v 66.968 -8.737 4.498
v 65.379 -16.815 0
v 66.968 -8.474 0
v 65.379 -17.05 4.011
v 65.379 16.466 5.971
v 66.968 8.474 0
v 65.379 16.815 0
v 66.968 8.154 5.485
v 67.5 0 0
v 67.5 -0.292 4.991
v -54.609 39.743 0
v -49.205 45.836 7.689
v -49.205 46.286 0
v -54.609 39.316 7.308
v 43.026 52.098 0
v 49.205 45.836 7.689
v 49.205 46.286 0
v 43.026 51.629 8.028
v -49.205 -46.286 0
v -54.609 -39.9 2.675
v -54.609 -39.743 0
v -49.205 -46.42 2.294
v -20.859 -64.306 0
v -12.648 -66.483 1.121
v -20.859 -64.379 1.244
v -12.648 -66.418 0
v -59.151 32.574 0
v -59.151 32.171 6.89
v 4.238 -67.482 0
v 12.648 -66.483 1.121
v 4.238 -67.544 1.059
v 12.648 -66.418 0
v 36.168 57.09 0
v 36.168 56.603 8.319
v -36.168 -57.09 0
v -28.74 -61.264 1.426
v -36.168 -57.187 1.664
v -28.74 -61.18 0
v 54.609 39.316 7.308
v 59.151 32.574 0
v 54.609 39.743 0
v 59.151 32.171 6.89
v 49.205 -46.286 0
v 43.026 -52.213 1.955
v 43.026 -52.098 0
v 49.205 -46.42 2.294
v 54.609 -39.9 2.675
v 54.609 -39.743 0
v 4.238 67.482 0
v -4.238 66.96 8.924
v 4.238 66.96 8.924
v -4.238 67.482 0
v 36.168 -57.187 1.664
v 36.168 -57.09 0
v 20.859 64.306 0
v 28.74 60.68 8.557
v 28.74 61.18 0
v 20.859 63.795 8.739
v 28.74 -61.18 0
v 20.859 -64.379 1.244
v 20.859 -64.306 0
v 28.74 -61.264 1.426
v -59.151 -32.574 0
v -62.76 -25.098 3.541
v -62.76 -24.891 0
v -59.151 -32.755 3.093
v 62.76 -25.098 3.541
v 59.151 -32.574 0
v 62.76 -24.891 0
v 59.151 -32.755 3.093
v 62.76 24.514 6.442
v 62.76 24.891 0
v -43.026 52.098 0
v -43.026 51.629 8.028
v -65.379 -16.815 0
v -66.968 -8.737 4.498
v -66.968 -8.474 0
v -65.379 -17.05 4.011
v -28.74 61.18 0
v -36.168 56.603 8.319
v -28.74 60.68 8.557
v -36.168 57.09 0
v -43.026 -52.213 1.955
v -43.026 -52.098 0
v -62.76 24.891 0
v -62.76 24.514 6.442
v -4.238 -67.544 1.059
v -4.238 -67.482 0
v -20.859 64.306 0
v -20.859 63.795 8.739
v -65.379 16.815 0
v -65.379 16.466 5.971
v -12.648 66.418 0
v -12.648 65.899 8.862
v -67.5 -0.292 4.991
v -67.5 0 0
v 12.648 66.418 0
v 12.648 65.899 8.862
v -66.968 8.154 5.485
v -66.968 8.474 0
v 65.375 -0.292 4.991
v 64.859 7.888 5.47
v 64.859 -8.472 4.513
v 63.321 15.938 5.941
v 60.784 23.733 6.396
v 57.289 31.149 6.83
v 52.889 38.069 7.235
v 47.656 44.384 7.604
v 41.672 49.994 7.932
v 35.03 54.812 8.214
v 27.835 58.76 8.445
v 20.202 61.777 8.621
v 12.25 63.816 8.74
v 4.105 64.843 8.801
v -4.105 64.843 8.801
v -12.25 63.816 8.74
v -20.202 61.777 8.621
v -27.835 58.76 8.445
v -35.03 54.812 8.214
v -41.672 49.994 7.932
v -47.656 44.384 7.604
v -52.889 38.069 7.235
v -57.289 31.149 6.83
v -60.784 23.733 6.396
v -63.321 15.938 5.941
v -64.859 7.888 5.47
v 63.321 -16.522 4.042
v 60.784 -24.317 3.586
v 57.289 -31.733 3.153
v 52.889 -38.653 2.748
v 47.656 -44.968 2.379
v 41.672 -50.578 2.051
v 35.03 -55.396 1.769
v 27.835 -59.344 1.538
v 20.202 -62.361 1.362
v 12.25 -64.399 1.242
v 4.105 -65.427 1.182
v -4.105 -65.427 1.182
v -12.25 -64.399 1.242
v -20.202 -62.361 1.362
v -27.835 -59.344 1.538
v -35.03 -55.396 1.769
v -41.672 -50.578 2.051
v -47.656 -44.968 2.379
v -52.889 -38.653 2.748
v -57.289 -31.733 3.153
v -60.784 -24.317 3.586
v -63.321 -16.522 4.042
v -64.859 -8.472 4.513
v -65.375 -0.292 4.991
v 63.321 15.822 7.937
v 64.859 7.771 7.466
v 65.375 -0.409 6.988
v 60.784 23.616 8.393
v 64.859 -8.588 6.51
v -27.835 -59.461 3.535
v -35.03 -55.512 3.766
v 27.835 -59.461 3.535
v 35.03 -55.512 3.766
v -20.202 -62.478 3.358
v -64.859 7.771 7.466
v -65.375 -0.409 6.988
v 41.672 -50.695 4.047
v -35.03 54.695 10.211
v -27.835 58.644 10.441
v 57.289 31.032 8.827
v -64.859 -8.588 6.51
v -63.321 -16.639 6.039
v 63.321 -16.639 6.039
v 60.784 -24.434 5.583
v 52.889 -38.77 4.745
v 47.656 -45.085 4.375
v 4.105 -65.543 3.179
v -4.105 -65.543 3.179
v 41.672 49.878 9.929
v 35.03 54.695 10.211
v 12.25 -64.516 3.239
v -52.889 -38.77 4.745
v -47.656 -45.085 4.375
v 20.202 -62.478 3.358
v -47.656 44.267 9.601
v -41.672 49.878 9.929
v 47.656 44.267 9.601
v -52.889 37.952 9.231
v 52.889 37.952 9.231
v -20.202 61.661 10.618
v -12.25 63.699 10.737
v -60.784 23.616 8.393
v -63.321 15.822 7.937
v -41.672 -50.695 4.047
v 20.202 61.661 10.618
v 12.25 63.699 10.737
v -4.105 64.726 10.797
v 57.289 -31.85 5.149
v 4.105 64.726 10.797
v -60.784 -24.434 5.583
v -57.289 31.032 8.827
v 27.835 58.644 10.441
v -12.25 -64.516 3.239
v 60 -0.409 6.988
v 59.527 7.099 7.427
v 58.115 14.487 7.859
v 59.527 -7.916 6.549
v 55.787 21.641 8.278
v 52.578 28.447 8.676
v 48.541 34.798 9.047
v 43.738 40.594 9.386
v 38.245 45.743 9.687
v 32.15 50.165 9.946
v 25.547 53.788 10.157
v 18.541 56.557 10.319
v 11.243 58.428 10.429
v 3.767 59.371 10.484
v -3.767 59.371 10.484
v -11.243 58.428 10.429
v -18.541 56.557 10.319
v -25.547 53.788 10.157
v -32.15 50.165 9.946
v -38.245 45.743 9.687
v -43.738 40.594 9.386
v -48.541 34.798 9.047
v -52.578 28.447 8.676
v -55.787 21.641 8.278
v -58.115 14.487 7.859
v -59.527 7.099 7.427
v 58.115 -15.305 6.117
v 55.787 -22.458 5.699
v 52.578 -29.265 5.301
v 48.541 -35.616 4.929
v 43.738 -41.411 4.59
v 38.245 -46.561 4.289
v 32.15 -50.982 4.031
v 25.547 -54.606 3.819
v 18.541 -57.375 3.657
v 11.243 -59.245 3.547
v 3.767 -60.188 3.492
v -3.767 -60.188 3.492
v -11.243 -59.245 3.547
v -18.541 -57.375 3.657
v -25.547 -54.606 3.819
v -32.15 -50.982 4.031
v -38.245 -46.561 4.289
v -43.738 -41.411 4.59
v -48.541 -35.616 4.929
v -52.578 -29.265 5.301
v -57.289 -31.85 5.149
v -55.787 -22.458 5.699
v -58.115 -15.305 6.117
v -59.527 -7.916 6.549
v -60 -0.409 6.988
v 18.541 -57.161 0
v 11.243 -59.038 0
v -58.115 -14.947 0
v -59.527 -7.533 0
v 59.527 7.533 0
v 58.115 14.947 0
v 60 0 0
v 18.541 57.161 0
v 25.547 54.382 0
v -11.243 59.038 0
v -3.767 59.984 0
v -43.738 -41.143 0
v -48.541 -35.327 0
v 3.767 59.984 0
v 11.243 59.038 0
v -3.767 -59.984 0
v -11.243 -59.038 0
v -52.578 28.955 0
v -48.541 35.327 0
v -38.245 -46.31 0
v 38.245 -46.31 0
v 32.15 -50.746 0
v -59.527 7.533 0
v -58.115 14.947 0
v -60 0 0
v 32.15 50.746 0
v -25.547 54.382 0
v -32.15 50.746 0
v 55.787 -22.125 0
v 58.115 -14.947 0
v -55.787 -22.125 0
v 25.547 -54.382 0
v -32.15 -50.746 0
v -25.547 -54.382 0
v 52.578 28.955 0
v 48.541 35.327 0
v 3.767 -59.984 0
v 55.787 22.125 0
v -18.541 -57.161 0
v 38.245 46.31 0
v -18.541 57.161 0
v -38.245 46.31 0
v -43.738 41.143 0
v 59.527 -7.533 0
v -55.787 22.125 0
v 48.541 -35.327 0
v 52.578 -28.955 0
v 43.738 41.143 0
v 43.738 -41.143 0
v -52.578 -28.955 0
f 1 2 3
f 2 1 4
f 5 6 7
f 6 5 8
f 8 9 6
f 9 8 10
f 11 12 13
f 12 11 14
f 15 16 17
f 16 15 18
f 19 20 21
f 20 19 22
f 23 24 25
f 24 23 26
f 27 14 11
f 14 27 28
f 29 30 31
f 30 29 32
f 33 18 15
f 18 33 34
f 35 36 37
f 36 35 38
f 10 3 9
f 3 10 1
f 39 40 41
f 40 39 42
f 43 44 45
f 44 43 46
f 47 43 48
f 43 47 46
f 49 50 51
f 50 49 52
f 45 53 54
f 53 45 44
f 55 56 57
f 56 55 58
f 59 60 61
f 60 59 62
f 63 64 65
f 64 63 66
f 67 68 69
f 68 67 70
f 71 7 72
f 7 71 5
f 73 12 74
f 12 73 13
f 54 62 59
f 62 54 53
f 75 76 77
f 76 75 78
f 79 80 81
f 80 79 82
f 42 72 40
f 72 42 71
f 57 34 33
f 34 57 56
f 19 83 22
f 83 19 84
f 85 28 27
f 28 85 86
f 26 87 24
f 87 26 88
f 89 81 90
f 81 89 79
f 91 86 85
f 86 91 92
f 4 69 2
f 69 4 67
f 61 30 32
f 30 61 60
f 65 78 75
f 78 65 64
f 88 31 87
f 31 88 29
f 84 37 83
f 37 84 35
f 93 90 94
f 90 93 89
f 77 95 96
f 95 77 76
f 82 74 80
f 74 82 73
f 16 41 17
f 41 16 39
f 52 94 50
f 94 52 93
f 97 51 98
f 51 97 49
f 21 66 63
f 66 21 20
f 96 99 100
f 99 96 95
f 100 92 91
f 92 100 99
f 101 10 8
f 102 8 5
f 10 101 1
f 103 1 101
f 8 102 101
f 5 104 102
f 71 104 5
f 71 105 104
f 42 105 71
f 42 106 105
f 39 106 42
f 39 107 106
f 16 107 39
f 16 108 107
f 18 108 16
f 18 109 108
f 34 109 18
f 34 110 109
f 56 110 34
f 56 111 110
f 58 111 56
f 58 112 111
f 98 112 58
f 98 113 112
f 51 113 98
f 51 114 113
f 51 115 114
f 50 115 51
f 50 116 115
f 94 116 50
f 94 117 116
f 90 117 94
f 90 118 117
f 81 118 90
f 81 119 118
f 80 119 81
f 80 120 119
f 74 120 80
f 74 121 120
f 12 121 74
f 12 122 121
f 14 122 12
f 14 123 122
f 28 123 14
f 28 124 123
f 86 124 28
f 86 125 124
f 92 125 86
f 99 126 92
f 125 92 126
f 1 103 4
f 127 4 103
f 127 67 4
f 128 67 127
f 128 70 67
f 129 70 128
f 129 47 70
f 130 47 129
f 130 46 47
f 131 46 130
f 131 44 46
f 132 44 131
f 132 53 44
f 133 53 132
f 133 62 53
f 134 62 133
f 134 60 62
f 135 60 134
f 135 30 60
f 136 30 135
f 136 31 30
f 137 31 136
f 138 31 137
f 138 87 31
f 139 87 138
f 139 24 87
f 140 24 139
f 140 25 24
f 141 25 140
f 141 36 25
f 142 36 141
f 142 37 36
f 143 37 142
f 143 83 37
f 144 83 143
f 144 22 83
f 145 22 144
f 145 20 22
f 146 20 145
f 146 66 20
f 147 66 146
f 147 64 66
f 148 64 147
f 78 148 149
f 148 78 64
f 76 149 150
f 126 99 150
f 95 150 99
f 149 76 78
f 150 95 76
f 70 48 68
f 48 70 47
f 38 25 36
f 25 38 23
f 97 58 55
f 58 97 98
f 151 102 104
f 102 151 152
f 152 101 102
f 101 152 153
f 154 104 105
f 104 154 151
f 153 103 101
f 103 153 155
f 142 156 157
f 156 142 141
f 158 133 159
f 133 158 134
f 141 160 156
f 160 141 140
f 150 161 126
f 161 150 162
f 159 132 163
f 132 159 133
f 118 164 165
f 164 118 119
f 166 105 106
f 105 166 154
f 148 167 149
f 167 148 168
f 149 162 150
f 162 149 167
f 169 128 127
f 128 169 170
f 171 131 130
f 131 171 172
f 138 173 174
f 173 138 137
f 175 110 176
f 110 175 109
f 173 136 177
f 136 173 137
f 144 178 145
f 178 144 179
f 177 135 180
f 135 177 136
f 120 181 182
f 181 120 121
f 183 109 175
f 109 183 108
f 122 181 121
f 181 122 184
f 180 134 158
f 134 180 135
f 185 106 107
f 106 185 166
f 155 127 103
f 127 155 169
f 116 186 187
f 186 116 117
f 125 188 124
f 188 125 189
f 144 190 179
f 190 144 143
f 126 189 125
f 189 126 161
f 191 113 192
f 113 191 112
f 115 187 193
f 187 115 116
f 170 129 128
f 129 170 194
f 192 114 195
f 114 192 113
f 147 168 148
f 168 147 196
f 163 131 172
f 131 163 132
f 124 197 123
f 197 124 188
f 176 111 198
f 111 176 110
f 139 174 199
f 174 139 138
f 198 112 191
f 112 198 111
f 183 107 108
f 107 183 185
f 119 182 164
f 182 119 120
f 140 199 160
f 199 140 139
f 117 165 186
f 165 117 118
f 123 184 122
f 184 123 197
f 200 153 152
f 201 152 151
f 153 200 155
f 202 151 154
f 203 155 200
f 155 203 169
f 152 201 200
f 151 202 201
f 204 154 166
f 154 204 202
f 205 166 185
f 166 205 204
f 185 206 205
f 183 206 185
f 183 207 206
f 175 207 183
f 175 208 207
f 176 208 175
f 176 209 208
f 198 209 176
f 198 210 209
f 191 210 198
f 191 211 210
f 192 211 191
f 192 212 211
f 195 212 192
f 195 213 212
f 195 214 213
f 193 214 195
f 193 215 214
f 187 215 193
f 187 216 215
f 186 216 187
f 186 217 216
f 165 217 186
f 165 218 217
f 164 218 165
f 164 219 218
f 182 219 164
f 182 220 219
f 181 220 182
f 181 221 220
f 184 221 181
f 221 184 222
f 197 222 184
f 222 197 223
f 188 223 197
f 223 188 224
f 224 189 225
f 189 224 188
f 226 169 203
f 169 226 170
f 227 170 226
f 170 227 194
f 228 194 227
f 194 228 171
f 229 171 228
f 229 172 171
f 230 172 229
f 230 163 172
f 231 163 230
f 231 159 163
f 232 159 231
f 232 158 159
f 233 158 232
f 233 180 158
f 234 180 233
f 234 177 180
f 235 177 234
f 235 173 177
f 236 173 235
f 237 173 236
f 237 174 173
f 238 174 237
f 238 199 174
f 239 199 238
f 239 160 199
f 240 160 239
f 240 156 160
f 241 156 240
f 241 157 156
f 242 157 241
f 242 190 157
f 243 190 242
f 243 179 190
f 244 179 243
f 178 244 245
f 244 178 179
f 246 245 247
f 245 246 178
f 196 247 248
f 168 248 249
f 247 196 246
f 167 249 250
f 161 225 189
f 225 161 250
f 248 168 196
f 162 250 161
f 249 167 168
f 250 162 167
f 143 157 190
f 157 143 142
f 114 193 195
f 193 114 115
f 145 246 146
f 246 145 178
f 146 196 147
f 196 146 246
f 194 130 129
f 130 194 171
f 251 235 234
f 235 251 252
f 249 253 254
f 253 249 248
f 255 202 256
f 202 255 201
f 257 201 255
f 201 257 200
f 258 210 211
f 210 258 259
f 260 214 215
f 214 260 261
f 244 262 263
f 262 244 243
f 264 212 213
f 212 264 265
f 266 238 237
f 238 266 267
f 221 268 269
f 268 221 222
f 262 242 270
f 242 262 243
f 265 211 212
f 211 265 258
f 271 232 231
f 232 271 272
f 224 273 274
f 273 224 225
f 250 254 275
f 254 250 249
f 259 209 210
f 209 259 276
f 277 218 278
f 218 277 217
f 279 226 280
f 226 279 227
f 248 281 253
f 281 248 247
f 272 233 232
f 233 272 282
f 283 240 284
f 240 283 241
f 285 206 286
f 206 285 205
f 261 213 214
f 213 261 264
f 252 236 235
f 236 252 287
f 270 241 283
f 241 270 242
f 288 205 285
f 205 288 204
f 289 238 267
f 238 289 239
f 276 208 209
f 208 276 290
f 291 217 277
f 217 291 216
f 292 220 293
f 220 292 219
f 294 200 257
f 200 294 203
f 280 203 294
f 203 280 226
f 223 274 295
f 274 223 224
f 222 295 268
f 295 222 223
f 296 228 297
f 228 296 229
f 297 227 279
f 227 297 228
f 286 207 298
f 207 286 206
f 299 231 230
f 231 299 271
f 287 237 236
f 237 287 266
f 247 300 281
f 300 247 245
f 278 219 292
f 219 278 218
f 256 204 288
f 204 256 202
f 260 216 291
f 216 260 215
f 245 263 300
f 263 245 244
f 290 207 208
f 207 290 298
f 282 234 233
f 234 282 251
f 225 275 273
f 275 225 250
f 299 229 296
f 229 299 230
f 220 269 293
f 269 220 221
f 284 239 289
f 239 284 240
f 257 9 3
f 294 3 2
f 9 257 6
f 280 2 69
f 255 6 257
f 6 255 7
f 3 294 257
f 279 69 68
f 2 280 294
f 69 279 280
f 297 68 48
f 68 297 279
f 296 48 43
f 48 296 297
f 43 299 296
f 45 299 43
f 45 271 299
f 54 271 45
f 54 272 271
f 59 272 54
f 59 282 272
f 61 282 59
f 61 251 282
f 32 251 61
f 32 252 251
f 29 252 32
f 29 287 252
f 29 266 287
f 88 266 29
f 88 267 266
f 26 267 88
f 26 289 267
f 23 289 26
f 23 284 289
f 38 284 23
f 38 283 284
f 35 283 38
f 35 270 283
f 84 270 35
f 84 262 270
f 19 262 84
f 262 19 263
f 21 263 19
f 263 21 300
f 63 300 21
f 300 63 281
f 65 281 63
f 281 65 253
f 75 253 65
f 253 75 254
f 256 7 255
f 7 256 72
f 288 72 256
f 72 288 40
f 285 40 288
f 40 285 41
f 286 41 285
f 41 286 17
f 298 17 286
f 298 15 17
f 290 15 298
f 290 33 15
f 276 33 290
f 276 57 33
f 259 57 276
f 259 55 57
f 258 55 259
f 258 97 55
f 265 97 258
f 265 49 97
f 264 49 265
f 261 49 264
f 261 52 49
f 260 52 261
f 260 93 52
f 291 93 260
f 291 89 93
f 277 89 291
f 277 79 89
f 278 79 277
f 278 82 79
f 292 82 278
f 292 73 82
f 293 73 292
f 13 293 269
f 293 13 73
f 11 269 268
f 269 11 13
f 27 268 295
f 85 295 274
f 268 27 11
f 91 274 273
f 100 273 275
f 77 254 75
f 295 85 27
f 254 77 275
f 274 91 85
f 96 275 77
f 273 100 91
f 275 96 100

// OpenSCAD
// Outer diameter of adapter ring, in millimeters.
ring_OD = 135;
// Inner diameter (flange) of adapter ring, in millimeters.
ring_ID = 130.75;
// Clearange diameter (the hole) of adapter ring, in millimeters.
ring_CD = 120;
// Nominal thickness (at zero degrees rotation) of adapter ring, in millimeters.  This is what you see on the outside.
ring_thickness = 5;
// Nominal thickness (at zero degrees rotation) of the inner ring, in millimeters.  Usually 2-4mm thicker than ring_thickness.
ring_inner_thickness = 7;
// The thickness of the siding in any units (so long as siding_reveal is given in the same units).
siding_thickness = 10;
// The reveal (visible width) of the siding in any units (so long as siding_thickness is given in the same units).
siding_reveal = 171;      

// OpenSCAD program which generates adapter rings for use between lamp flanges and lapped siding.
// NOTE: For the various diameter values, when printing in ABS, you might want to increase the diameter by
// about 1% to account for ABS thermal expansion (contraction, when it cools).

angle = atan2(siding_thickness, siding_reveal);
echo(str("angle=", angle));
ring_OR = ring_OD / 2;
ring_IR = ring_ID / 2;
ring_CR = ring_CD / 2;
difference()
{
	rotate([angle,0,0])
	{
		difference()
		{
			union()
			{
				cylinder(r=ring_OR, h=ring_thickness*2, center=true, $fn=50);
				cylinder(r=ring_IR, h=ring_inner_thickness*2, center=true, $fn=50);
			}
			cylinder(r=ring_CR, h=ring_thickness*4, center=true, $fn=50);
		}
	}
	translate([0,0,-ring_thickness*2]) cube([ring_OD*1.5, ring_OD*1.5, ring_thickness * 4], center=true);
}
